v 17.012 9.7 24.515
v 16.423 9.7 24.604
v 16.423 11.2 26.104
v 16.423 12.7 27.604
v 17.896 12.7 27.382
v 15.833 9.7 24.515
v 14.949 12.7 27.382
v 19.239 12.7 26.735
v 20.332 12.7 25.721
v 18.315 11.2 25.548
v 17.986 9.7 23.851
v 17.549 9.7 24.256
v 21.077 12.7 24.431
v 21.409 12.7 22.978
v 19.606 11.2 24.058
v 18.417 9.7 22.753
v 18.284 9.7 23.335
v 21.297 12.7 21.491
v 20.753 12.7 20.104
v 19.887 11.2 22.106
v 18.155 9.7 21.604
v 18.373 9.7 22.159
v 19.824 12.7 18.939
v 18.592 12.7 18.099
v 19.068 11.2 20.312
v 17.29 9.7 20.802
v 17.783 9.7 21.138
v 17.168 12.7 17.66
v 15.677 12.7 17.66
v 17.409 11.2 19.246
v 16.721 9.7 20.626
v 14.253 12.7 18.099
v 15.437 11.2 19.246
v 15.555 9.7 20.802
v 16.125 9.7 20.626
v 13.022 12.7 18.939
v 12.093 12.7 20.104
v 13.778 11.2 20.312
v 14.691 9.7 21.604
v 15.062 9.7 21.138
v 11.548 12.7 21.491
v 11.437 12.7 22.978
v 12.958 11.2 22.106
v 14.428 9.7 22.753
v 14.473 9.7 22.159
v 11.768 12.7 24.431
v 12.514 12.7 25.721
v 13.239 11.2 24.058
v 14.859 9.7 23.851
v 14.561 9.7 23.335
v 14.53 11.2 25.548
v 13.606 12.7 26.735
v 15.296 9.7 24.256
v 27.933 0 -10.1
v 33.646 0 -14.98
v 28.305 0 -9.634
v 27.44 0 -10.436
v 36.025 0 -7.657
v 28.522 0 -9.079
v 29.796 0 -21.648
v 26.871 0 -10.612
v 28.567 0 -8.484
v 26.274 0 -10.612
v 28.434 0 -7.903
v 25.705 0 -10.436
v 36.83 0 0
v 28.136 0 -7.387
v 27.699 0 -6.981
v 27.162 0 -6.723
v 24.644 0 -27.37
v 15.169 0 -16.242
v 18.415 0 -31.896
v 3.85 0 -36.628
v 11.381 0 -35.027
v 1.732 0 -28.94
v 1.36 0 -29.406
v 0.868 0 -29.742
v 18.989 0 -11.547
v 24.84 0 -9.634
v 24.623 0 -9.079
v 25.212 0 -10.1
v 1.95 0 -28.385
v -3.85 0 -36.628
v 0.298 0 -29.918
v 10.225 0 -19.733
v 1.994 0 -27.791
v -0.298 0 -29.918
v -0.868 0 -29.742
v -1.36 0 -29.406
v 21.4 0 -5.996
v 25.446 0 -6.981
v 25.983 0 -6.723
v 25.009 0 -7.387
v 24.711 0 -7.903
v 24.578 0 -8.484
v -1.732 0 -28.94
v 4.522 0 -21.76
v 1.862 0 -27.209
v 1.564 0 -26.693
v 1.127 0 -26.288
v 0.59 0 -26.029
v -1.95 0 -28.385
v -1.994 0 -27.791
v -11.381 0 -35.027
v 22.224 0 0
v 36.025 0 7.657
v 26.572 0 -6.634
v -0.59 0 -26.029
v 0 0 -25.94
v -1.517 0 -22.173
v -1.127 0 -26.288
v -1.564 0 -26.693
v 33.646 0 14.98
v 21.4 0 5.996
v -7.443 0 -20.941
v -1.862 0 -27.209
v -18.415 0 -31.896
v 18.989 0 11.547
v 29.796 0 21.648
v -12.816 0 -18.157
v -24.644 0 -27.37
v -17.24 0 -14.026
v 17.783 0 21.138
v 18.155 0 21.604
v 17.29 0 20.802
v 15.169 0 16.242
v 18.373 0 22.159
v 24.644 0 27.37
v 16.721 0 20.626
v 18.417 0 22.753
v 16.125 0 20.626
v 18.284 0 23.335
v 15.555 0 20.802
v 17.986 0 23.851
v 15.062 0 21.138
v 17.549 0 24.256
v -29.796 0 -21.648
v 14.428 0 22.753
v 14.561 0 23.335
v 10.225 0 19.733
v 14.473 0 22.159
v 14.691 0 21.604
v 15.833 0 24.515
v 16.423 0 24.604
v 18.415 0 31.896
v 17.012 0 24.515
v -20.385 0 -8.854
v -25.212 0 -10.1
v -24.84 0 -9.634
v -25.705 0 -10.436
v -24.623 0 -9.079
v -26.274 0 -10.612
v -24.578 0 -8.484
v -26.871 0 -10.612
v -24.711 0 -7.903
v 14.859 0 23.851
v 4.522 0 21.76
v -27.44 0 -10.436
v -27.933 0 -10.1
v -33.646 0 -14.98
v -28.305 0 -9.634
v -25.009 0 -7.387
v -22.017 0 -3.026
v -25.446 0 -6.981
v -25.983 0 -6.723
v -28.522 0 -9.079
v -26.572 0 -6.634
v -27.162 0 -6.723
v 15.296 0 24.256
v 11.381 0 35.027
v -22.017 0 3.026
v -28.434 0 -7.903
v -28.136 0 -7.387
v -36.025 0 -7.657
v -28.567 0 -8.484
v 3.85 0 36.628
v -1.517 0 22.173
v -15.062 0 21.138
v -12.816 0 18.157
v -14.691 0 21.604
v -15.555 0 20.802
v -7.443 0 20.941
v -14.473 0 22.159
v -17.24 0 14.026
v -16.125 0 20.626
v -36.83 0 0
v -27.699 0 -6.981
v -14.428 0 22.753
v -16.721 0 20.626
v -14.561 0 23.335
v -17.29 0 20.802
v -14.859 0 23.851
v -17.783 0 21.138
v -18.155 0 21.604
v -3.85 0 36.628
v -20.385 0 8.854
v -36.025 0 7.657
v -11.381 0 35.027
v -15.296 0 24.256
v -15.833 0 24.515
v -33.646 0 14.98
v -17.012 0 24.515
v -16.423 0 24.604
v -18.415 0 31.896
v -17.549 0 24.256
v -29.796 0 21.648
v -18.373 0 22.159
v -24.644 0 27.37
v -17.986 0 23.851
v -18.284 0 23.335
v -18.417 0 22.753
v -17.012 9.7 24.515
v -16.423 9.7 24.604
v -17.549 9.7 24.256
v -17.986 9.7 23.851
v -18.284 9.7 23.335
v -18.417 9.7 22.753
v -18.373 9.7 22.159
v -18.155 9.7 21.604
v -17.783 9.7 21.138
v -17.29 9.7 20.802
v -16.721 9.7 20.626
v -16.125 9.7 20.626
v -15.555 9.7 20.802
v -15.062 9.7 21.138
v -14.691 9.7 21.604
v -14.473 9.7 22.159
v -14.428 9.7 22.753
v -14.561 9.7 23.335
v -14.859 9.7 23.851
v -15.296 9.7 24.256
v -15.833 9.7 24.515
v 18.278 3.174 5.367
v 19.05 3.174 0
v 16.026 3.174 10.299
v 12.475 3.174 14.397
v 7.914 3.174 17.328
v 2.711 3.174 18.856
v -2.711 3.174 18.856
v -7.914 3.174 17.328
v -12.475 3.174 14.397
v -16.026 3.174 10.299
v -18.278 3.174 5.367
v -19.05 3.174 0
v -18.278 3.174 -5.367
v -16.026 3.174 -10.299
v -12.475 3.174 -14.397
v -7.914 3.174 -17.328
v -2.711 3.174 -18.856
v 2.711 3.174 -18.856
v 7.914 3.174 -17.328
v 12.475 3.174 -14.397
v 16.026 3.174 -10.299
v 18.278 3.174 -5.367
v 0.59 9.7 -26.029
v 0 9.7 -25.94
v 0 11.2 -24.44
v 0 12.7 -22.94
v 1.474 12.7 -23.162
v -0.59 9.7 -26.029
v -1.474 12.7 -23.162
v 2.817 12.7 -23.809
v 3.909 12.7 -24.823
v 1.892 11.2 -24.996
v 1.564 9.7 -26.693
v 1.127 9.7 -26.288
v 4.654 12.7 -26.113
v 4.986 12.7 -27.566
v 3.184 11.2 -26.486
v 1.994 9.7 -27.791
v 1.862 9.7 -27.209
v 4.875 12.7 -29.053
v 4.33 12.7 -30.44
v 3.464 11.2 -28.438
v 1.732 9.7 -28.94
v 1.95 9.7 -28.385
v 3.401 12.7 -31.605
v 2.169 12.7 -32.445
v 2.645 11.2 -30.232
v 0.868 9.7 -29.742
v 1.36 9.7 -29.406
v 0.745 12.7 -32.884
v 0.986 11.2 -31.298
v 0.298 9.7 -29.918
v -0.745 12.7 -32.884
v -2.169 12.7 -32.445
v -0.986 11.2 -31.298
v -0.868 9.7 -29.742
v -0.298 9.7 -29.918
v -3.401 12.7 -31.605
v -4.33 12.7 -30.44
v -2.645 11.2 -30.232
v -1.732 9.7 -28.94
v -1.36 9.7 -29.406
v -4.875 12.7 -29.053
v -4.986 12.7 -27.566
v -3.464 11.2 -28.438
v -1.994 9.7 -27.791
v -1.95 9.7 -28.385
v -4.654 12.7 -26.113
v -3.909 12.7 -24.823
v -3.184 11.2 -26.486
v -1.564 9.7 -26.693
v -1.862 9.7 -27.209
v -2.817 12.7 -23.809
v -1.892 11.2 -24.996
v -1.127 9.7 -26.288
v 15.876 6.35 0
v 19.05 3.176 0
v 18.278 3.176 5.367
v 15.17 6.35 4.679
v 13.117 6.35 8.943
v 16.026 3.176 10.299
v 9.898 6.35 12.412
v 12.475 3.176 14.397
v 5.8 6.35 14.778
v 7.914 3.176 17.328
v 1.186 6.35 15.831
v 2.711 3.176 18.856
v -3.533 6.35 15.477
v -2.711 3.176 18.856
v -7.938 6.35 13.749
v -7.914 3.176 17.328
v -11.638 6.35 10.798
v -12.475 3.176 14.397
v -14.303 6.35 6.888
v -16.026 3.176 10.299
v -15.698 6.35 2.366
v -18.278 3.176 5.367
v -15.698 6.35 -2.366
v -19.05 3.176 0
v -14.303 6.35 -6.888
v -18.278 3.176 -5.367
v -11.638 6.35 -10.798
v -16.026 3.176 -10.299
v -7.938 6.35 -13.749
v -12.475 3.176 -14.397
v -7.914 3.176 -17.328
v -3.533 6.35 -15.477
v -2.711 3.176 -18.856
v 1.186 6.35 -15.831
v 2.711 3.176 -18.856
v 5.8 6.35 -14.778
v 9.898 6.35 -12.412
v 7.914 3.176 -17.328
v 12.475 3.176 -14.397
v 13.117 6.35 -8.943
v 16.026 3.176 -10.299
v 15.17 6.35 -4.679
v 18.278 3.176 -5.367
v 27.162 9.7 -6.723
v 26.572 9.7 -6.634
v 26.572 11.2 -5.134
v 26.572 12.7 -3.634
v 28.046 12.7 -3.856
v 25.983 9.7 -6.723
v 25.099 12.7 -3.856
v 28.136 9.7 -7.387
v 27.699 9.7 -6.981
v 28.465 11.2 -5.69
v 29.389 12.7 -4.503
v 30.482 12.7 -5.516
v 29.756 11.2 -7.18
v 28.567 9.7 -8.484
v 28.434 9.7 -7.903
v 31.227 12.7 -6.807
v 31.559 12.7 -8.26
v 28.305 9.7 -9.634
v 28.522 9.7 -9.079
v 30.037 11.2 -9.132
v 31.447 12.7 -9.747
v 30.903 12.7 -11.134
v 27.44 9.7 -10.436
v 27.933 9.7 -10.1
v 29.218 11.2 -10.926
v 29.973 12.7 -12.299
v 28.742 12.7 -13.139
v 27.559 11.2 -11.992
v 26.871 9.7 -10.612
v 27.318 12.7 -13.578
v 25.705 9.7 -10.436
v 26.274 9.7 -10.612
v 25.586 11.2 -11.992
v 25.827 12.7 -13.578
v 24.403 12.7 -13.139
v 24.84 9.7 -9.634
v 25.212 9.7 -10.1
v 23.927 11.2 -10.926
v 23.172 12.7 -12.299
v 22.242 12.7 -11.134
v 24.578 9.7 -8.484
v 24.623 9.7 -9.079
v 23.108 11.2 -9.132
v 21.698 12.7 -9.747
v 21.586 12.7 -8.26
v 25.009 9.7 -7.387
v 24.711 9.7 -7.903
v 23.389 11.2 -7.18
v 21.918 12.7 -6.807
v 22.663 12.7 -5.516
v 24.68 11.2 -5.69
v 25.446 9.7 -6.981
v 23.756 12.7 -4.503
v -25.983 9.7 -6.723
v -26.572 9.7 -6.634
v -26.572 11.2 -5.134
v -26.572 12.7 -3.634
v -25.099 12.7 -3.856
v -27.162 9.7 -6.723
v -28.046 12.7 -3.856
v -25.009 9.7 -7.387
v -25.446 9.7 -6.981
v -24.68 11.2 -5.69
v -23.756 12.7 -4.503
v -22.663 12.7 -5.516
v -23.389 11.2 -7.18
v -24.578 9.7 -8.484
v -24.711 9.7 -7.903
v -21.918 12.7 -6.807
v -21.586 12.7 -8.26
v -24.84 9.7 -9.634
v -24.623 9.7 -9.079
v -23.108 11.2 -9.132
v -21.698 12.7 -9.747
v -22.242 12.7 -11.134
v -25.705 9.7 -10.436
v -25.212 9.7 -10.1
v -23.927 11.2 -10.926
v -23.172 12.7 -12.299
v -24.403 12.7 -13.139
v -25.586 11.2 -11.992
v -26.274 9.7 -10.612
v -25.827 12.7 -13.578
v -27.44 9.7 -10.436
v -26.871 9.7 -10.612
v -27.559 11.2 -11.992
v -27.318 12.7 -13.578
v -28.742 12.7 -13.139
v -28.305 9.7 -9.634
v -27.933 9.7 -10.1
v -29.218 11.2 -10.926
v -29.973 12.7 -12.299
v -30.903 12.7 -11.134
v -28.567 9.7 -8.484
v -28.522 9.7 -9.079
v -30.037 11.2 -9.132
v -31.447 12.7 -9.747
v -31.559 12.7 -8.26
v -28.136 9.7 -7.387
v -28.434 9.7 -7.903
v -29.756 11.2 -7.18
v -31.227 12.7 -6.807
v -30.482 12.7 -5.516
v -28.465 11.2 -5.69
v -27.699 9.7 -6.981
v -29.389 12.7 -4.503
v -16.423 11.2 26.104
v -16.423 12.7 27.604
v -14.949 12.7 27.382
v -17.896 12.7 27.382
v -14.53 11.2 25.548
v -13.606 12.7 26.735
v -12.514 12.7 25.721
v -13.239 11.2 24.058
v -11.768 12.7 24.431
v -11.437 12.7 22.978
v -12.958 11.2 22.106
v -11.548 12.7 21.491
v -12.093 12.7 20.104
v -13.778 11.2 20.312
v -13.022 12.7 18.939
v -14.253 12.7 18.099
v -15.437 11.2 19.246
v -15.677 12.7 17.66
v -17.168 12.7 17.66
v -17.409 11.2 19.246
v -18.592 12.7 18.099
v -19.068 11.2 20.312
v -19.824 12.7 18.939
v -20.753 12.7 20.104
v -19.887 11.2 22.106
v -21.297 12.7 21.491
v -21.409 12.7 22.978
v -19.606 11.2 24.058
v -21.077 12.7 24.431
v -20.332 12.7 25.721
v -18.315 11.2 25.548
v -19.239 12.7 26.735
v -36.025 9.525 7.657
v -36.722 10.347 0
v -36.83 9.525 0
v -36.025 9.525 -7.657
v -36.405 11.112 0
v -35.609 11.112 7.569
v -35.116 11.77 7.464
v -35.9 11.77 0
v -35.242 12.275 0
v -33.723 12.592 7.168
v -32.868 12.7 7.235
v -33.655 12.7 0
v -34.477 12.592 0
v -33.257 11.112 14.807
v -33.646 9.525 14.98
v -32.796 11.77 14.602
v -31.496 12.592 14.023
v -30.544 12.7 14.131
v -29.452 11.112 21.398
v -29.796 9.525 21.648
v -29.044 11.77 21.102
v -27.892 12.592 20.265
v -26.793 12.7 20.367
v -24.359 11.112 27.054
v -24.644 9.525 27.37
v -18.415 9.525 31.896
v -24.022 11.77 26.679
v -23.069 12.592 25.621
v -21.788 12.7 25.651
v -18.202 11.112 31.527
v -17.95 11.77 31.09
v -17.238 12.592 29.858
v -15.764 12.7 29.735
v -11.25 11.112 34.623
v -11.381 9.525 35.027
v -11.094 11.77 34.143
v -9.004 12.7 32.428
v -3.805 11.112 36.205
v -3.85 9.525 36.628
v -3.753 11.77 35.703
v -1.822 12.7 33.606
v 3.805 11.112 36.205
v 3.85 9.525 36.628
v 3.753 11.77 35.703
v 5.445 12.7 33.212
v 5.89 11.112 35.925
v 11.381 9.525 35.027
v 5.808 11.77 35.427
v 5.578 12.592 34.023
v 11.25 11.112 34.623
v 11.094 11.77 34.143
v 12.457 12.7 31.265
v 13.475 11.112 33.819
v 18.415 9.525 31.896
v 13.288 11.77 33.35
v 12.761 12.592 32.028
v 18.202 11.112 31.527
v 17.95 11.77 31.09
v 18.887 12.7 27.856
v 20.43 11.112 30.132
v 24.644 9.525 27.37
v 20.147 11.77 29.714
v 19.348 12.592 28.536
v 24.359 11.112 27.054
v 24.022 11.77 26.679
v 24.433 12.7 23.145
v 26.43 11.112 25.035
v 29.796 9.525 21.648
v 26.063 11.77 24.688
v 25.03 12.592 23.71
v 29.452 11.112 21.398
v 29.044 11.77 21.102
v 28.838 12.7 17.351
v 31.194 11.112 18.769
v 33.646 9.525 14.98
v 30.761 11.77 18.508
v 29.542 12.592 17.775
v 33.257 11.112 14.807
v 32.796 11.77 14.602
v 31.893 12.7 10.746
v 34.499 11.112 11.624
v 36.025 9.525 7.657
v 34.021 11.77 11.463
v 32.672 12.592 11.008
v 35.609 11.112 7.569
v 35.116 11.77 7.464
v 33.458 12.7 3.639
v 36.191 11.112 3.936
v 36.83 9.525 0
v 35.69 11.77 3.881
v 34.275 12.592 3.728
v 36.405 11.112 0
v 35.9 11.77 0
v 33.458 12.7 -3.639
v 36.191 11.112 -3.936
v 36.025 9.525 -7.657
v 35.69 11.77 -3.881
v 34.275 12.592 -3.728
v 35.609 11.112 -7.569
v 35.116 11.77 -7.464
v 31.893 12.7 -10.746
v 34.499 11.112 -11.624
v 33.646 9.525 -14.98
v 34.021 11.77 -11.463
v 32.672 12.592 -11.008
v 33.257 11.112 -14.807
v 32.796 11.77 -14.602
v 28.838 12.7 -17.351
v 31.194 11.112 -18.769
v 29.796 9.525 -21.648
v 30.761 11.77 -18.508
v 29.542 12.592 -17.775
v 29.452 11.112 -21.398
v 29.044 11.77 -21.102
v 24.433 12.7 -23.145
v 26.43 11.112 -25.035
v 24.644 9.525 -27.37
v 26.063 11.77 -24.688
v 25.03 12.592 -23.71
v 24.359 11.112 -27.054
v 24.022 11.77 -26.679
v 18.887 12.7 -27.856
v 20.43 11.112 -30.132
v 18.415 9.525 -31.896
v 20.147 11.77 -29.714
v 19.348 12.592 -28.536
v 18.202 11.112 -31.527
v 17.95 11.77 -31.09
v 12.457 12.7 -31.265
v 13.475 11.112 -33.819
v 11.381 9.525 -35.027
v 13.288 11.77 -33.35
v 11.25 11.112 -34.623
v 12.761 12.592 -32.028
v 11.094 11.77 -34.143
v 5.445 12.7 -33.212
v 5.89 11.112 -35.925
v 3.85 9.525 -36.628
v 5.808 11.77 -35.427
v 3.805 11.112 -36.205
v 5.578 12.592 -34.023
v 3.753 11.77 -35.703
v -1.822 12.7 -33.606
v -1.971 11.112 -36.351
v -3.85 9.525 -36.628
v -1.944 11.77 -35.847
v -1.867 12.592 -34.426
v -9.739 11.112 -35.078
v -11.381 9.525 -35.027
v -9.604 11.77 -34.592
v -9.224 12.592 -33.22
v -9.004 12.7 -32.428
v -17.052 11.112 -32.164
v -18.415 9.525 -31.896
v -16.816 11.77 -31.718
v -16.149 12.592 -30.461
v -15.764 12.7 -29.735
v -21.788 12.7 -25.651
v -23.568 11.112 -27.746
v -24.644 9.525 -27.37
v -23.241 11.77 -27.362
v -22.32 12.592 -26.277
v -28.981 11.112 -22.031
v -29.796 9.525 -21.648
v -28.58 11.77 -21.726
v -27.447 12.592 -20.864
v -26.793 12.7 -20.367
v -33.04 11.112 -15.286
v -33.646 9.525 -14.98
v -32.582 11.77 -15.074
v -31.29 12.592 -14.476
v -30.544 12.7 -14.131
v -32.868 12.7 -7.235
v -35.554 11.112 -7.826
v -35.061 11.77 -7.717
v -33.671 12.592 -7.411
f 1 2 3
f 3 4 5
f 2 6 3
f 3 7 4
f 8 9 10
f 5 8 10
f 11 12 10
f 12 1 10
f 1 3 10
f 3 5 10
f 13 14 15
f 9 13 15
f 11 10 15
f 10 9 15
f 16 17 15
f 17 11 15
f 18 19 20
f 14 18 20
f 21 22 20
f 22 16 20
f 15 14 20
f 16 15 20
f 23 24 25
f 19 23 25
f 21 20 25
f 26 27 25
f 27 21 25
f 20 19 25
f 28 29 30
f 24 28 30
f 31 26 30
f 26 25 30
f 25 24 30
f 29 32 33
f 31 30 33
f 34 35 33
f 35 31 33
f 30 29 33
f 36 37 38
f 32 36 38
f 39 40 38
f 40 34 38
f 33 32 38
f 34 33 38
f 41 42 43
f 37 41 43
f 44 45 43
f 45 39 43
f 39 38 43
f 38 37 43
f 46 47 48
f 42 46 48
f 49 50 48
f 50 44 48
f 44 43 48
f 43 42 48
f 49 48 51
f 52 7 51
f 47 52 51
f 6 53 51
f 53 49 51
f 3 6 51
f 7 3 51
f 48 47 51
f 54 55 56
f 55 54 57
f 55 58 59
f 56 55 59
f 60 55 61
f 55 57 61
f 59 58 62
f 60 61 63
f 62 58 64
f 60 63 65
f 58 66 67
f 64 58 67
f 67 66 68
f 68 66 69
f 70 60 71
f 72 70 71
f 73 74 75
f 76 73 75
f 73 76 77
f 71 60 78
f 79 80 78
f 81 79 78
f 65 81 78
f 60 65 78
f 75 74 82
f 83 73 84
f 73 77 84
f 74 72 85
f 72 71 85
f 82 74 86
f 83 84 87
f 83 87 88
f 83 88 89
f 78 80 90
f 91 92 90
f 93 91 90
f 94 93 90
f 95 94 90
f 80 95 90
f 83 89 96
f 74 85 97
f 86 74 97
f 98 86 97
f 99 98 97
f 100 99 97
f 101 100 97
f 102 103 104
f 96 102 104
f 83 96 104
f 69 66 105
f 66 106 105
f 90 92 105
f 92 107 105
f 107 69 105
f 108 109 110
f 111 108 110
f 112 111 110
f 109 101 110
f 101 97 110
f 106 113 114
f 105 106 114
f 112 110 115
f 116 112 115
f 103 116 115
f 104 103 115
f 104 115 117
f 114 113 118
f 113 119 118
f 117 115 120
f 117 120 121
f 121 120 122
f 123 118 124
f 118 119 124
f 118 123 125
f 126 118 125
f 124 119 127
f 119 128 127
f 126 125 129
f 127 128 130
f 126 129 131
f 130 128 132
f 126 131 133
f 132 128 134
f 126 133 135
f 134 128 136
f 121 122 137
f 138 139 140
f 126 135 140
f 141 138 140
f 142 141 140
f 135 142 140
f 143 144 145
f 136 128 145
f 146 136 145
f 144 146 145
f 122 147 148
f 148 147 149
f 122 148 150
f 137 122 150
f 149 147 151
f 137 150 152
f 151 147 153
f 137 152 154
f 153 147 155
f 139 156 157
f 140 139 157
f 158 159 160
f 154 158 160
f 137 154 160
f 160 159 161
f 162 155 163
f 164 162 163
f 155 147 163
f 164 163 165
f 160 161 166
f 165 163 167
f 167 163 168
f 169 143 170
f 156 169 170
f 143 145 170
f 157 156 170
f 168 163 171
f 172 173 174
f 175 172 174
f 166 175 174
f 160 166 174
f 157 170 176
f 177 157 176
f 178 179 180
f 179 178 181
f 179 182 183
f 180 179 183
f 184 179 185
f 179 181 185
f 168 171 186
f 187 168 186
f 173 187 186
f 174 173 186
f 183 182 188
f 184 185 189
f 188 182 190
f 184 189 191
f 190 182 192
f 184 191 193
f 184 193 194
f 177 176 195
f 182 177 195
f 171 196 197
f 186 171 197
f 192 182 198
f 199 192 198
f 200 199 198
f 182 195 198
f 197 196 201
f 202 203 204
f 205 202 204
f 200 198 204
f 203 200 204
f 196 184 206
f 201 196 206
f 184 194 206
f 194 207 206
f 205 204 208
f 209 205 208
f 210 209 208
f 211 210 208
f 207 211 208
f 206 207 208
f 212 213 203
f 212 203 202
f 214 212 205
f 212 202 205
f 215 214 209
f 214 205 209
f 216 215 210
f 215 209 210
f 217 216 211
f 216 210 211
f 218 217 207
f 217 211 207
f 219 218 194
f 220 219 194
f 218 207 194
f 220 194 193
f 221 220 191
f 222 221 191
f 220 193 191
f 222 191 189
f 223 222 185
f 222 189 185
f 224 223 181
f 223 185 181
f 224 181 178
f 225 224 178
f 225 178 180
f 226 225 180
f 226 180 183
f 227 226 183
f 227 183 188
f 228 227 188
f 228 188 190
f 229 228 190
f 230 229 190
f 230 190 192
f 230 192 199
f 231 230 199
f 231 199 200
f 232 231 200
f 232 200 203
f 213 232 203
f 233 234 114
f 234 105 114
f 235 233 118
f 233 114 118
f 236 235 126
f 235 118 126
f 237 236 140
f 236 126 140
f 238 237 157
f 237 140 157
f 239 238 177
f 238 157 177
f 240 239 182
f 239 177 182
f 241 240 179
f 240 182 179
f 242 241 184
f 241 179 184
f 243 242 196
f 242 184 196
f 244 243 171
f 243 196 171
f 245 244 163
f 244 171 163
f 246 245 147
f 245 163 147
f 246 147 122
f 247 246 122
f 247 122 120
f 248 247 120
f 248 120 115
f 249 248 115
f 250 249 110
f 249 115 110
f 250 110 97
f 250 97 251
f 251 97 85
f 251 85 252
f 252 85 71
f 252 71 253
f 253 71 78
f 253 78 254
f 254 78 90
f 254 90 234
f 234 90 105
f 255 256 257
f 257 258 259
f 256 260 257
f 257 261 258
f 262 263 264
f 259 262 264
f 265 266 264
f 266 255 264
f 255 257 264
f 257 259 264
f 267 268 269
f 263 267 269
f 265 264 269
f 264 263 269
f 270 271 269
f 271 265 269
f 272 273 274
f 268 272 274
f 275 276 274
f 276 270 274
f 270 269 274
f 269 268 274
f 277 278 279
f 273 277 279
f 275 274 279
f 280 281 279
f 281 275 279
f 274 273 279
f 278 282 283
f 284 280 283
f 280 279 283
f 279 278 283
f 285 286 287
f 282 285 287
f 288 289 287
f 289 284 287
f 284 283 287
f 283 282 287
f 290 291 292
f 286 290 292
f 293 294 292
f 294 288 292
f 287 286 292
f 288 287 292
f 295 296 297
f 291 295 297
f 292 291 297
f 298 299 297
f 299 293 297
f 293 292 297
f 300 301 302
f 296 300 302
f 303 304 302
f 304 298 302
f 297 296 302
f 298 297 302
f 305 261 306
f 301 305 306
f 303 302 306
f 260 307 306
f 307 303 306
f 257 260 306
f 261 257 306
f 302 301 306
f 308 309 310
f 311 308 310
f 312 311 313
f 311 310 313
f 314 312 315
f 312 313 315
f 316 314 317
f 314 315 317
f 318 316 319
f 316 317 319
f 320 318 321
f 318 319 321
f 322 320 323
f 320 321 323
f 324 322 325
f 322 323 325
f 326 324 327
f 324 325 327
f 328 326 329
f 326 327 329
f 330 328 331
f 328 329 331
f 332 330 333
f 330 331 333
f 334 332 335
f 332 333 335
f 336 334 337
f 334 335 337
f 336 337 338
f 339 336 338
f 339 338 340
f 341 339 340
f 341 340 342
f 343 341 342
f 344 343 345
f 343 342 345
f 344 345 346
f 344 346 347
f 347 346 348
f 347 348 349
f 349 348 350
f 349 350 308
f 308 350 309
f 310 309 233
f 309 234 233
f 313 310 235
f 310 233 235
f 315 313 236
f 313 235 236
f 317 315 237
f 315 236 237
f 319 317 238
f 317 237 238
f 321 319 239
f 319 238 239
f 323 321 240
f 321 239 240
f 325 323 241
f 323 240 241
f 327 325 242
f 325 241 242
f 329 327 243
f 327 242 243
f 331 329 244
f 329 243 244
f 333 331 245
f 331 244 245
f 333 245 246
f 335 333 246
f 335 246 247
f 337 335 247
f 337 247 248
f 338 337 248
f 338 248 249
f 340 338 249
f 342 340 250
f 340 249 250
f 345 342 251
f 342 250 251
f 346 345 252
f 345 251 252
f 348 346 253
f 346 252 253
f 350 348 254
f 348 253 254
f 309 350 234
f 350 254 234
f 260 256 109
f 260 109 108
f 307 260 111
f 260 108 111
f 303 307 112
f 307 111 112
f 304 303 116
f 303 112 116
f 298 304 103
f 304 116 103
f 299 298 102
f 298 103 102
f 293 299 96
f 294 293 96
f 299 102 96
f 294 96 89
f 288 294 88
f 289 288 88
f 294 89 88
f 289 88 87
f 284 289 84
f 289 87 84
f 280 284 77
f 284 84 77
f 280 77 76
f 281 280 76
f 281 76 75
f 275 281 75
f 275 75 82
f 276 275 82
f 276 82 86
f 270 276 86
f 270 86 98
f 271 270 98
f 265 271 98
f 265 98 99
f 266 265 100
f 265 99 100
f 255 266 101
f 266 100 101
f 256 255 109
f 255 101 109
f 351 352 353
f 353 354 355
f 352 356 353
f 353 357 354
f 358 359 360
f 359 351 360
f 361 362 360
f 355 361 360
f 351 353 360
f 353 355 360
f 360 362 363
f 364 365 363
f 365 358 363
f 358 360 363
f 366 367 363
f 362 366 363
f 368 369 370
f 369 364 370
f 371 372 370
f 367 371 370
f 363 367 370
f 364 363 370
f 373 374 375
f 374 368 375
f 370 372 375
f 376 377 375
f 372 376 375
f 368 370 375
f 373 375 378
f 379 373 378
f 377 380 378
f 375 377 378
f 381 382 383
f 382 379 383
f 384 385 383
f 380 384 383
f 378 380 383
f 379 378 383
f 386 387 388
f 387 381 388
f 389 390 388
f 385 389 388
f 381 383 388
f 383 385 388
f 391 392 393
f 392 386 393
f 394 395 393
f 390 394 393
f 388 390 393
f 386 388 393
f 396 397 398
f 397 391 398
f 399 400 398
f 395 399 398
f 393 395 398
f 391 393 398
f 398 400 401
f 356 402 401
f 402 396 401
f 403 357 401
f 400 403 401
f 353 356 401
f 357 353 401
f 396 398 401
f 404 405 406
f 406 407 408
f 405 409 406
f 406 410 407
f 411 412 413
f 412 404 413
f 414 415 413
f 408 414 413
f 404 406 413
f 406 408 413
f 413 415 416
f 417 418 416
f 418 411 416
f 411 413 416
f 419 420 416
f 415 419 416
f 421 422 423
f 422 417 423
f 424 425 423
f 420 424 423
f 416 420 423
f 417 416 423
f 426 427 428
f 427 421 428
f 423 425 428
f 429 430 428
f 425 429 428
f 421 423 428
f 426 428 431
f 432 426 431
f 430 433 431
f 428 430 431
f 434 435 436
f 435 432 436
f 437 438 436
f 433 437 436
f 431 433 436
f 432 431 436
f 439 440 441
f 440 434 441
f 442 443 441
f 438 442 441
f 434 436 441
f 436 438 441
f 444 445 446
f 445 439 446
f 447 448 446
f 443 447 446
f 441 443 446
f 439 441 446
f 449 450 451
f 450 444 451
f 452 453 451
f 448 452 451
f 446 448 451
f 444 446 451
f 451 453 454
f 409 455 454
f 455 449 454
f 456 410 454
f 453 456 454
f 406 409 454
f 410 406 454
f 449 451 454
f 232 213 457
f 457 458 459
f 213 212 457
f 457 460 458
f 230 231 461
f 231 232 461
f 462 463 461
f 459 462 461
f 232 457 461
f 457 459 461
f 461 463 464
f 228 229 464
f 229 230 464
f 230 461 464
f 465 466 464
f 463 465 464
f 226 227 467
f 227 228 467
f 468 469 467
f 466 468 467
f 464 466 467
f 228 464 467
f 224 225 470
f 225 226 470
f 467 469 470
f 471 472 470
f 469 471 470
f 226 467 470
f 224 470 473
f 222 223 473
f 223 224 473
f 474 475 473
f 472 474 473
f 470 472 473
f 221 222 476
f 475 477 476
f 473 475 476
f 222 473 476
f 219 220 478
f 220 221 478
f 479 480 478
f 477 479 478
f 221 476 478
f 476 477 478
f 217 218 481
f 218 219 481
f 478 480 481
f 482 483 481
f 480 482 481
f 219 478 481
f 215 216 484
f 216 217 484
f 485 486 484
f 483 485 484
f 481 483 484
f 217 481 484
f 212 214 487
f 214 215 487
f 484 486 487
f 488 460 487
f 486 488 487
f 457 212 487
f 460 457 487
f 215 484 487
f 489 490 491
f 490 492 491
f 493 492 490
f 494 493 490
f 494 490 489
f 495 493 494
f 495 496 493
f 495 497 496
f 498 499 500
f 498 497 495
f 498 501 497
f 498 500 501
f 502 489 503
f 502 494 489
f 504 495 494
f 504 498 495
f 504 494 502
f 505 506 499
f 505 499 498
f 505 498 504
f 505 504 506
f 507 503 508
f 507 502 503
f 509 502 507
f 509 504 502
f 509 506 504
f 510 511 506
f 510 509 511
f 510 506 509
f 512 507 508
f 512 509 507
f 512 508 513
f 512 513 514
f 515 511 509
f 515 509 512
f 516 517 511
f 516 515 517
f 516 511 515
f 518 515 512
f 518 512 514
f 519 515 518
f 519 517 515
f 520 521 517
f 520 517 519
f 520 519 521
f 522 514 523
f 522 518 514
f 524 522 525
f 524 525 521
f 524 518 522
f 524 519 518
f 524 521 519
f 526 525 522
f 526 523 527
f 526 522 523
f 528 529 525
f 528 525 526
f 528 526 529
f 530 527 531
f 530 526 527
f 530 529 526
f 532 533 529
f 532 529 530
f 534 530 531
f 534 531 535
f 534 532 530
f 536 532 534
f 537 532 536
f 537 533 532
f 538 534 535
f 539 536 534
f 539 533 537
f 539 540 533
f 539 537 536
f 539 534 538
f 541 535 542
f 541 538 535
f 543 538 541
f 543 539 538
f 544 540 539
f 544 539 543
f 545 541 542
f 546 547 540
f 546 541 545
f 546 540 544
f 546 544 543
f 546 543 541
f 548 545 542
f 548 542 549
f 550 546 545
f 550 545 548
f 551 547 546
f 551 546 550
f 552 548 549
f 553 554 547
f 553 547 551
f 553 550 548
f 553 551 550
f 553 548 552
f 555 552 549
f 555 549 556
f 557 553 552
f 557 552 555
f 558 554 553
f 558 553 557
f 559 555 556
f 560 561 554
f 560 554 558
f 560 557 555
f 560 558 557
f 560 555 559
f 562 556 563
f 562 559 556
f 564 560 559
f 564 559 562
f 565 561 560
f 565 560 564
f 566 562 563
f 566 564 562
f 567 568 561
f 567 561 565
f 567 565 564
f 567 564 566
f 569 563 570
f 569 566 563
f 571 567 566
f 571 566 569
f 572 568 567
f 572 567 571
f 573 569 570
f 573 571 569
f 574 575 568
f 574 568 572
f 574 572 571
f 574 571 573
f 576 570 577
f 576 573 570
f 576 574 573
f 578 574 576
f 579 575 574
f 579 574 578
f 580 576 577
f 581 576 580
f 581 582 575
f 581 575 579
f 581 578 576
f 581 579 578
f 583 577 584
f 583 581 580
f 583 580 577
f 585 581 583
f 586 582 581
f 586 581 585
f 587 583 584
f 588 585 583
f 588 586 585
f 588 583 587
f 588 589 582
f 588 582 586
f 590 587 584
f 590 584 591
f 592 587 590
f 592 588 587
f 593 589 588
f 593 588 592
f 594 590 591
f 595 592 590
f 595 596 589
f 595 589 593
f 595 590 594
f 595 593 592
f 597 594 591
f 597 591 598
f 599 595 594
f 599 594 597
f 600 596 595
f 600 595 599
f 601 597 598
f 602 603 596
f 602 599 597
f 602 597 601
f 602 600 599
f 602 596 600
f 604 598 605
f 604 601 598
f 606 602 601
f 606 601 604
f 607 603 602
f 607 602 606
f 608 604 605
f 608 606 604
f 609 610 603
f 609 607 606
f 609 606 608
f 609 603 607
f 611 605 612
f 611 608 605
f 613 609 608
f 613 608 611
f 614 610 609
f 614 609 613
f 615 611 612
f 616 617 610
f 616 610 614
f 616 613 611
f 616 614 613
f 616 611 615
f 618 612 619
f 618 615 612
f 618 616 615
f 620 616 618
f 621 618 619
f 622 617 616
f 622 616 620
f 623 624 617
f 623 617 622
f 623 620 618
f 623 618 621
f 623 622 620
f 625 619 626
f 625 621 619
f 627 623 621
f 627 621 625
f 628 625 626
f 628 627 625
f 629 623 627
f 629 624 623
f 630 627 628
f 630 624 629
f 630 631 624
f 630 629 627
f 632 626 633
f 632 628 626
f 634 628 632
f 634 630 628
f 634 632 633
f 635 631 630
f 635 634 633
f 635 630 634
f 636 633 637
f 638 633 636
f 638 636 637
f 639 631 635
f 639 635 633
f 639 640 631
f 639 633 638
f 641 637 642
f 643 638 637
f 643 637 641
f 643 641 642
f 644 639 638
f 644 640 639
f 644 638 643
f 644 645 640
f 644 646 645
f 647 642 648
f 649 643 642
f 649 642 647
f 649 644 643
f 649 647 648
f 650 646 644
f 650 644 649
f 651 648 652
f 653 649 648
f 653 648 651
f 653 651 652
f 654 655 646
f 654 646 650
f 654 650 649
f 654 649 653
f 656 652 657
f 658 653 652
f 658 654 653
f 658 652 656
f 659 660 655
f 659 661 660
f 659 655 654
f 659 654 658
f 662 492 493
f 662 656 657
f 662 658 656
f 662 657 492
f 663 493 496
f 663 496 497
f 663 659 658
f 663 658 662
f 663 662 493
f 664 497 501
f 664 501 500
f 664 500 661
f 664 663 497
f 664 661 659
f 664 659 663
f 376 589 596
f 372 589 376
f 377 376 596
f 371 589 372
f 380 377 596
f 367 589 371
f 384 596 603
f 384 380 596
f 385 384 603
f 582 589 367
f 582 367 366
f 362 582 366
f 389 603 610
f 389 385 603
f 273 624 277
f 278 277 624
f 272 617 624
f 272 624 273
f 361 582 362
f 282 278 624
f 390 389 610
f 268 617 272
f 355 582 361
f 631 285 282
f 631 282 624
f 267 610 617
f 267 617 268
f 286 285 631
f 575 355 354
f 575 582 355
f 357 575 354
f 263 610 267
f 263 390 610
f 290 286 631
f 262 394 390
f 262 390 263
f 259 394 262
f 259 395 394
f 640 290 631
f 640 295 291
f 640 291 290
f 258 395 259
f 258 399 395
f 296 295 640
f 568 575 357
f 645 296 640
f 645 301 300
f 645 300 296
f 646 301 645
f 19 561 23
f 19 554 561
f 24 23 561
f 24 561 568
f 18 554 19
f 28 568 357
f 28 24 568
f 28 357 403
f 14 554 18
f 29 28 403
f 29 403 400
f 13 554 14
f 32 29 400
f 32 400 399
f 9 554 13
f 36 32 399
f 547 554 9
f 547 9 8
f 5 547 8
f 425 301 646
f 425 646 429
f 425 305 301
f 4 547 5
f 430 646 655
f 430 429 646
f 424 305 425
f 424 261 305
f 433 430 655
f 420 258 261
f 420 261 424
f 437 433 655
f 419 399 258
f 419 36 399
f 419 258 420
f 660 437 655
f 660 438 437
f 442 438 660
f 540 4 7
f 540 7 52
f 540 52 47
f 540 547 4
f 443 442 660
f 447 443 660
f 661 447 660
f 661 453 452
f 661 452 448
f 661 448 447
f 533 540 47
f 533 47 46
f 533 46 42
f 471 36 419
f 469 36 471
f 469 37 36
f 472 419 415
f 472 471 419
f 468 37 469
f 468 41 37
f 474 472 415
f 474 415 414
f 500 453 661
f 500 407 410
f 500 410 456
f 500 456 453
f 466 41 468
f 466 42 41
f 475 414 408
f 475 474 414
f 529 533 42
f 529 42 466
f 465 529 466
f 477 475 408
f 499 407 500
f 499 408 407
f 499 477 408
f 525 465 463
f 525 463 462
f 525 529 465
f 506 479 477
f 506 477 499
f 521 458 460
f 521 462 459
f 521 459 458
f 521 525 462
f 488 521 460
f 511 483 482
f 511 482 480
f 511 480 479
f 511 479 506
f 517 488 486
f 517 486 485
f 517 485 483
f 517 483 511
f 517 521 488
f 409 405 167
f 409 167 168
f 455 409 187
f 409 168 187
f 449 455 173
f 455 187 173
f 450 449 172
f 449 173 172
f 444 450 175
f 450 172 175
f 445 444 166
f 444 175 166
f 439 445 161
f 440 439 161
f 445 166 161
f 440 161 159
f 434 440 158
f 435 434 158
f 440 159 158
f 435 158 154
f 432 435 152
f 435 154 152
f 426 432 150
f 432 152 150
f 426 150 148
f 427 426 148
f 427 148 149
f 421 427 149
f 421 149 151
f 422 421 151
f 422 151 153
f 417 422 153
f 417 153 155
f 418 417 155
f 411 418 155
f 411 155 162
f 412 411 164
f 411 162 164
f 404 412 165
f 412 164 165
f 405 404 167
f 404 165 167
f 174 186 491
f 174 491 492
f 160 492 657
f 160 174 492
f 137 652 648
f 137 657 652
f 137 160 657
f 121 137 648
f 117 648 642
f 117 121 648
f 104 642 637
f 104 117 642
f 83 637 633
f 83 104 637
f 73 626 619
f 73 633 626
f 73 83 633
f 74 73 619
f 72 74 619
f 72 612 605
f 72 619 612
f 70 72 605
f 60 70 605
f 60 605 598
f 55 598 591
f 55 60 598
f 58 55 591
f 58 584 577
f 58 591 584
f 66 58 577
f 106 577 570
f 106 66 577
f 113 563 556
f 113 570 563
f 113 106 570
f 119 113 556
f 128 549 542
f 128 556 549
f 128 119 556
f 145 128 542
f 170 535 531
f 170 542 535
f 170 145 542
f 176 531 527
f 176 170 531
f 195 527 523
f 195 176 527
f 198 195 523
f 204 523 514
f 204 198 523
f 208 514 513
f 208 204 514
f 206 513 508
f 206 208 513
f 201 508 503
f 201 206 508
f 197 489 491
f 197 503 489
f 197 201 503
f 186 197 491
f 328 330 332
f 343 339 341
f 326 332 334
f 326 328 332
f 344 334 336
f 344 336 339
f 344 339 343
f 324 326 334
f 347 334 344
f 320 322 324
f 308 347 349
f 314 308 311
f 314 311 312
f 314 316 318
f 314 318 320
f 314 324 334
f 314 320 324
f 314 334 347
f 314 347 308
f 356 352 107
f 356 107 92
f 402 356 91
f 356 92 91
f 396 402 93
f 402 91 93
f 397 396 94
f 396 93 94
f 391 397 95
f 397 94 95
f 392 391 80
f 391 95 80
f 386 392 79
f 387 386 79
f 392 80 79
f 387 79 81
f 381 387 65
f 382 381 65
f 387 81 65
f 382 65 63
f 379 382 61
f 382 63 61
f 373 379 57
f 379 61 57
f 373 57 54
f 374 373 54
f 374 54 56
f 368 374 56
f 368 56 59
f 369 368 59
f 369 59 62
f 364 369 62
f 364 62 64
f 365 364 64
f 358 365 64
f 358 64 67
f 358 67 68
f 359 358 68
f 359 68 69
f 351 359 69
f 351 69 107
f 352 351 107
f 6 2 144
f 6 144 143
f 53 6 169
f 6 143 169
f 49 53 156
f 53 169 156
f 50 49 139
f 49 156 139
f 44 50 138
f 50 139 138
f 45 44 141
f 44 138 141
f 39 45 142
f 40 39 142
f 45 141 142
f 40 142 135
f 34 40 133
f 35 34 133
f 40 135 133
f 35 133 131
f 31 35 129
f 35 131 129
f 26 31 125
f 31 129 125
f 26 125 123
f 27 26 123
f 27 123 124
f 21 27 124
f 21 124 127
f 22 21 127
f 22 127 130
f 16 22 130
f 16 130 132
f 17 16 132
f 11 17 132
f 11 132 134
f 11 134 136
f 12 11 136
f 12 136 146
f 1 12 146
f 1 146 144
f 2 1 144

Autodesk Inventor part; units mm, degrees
ref_plane "YZ Plane" through (0, 0, 0) normal (1, 0, 0) x (0, 1, 0)
ref_plane "XZ Plane" through (0, 0, 0) normal (0, 1, 0) x (-1, 0, 0)
ref_plane "XY Plane" through (0, 0, 0) normal (0, 0, 1) x (1, 0, 0)
sketch "Sketch1" plane through (0, 0, 0) normal (0, 1, 0) x (-1, 0, 0)
  circle A0 centre (0, 0) radius 36.83
  dimension "d0" = 73.66
extrude "Extrusion1" add sketch "Sketch1" along normal blind 12.7
fillet "Fillet1" radius 3.175 1 edges at (36.83, 12.7, 0)
sketch "Sketch3" plane through (0, 0, 0) normal (0, -1, 0) x (1, 0, 0)
  circle A0 centre (0, 0) radius 19.05
  dimension "d12" = 38.1
extrude "Extrusion3" cut sketch "Sketch3" against normal blind 6.35
chamfer "Chamfer1" distance 3.175 angle 45 2 edges at (-19.05, 0, 0) (-19.05, 6.35, 0)
sketch "Sketch5" plane through (0, 12.7, 0) normal (0, 1, 0) x (1, 0, 0)
  line L0 (0, 0) -> (0, 27.94)
  point P0 (-26.5725, 8.6339)
  point P1 (-26.5725, 8.6339)
  point P2 (-16.4227, -22.6039)
  point P3 (-16.4227, -22.6039)
  point P4 (16.4227, -22.6039)
  point P5 (16.4227, -22.6039)
  point P6 (26.5725, 8.6339)
  point P7 (26.5725, 8.6339)
  dimension "d18" = 27.94
  dimension "d21" = 360
hole "Hole1" at (0, 12.7, -27.94) at (-26.5725, 12.7, -8.6339) at (-16.4227, 12.7, 22.6039) at (16.4227, 12.7, 22.6039) at (26.5725, 12.7, -8.6339) direction (0, -1, 0) diameter 4 end through all countersink diameter 10 countersink angle 90
properties part number "bearingplate"
